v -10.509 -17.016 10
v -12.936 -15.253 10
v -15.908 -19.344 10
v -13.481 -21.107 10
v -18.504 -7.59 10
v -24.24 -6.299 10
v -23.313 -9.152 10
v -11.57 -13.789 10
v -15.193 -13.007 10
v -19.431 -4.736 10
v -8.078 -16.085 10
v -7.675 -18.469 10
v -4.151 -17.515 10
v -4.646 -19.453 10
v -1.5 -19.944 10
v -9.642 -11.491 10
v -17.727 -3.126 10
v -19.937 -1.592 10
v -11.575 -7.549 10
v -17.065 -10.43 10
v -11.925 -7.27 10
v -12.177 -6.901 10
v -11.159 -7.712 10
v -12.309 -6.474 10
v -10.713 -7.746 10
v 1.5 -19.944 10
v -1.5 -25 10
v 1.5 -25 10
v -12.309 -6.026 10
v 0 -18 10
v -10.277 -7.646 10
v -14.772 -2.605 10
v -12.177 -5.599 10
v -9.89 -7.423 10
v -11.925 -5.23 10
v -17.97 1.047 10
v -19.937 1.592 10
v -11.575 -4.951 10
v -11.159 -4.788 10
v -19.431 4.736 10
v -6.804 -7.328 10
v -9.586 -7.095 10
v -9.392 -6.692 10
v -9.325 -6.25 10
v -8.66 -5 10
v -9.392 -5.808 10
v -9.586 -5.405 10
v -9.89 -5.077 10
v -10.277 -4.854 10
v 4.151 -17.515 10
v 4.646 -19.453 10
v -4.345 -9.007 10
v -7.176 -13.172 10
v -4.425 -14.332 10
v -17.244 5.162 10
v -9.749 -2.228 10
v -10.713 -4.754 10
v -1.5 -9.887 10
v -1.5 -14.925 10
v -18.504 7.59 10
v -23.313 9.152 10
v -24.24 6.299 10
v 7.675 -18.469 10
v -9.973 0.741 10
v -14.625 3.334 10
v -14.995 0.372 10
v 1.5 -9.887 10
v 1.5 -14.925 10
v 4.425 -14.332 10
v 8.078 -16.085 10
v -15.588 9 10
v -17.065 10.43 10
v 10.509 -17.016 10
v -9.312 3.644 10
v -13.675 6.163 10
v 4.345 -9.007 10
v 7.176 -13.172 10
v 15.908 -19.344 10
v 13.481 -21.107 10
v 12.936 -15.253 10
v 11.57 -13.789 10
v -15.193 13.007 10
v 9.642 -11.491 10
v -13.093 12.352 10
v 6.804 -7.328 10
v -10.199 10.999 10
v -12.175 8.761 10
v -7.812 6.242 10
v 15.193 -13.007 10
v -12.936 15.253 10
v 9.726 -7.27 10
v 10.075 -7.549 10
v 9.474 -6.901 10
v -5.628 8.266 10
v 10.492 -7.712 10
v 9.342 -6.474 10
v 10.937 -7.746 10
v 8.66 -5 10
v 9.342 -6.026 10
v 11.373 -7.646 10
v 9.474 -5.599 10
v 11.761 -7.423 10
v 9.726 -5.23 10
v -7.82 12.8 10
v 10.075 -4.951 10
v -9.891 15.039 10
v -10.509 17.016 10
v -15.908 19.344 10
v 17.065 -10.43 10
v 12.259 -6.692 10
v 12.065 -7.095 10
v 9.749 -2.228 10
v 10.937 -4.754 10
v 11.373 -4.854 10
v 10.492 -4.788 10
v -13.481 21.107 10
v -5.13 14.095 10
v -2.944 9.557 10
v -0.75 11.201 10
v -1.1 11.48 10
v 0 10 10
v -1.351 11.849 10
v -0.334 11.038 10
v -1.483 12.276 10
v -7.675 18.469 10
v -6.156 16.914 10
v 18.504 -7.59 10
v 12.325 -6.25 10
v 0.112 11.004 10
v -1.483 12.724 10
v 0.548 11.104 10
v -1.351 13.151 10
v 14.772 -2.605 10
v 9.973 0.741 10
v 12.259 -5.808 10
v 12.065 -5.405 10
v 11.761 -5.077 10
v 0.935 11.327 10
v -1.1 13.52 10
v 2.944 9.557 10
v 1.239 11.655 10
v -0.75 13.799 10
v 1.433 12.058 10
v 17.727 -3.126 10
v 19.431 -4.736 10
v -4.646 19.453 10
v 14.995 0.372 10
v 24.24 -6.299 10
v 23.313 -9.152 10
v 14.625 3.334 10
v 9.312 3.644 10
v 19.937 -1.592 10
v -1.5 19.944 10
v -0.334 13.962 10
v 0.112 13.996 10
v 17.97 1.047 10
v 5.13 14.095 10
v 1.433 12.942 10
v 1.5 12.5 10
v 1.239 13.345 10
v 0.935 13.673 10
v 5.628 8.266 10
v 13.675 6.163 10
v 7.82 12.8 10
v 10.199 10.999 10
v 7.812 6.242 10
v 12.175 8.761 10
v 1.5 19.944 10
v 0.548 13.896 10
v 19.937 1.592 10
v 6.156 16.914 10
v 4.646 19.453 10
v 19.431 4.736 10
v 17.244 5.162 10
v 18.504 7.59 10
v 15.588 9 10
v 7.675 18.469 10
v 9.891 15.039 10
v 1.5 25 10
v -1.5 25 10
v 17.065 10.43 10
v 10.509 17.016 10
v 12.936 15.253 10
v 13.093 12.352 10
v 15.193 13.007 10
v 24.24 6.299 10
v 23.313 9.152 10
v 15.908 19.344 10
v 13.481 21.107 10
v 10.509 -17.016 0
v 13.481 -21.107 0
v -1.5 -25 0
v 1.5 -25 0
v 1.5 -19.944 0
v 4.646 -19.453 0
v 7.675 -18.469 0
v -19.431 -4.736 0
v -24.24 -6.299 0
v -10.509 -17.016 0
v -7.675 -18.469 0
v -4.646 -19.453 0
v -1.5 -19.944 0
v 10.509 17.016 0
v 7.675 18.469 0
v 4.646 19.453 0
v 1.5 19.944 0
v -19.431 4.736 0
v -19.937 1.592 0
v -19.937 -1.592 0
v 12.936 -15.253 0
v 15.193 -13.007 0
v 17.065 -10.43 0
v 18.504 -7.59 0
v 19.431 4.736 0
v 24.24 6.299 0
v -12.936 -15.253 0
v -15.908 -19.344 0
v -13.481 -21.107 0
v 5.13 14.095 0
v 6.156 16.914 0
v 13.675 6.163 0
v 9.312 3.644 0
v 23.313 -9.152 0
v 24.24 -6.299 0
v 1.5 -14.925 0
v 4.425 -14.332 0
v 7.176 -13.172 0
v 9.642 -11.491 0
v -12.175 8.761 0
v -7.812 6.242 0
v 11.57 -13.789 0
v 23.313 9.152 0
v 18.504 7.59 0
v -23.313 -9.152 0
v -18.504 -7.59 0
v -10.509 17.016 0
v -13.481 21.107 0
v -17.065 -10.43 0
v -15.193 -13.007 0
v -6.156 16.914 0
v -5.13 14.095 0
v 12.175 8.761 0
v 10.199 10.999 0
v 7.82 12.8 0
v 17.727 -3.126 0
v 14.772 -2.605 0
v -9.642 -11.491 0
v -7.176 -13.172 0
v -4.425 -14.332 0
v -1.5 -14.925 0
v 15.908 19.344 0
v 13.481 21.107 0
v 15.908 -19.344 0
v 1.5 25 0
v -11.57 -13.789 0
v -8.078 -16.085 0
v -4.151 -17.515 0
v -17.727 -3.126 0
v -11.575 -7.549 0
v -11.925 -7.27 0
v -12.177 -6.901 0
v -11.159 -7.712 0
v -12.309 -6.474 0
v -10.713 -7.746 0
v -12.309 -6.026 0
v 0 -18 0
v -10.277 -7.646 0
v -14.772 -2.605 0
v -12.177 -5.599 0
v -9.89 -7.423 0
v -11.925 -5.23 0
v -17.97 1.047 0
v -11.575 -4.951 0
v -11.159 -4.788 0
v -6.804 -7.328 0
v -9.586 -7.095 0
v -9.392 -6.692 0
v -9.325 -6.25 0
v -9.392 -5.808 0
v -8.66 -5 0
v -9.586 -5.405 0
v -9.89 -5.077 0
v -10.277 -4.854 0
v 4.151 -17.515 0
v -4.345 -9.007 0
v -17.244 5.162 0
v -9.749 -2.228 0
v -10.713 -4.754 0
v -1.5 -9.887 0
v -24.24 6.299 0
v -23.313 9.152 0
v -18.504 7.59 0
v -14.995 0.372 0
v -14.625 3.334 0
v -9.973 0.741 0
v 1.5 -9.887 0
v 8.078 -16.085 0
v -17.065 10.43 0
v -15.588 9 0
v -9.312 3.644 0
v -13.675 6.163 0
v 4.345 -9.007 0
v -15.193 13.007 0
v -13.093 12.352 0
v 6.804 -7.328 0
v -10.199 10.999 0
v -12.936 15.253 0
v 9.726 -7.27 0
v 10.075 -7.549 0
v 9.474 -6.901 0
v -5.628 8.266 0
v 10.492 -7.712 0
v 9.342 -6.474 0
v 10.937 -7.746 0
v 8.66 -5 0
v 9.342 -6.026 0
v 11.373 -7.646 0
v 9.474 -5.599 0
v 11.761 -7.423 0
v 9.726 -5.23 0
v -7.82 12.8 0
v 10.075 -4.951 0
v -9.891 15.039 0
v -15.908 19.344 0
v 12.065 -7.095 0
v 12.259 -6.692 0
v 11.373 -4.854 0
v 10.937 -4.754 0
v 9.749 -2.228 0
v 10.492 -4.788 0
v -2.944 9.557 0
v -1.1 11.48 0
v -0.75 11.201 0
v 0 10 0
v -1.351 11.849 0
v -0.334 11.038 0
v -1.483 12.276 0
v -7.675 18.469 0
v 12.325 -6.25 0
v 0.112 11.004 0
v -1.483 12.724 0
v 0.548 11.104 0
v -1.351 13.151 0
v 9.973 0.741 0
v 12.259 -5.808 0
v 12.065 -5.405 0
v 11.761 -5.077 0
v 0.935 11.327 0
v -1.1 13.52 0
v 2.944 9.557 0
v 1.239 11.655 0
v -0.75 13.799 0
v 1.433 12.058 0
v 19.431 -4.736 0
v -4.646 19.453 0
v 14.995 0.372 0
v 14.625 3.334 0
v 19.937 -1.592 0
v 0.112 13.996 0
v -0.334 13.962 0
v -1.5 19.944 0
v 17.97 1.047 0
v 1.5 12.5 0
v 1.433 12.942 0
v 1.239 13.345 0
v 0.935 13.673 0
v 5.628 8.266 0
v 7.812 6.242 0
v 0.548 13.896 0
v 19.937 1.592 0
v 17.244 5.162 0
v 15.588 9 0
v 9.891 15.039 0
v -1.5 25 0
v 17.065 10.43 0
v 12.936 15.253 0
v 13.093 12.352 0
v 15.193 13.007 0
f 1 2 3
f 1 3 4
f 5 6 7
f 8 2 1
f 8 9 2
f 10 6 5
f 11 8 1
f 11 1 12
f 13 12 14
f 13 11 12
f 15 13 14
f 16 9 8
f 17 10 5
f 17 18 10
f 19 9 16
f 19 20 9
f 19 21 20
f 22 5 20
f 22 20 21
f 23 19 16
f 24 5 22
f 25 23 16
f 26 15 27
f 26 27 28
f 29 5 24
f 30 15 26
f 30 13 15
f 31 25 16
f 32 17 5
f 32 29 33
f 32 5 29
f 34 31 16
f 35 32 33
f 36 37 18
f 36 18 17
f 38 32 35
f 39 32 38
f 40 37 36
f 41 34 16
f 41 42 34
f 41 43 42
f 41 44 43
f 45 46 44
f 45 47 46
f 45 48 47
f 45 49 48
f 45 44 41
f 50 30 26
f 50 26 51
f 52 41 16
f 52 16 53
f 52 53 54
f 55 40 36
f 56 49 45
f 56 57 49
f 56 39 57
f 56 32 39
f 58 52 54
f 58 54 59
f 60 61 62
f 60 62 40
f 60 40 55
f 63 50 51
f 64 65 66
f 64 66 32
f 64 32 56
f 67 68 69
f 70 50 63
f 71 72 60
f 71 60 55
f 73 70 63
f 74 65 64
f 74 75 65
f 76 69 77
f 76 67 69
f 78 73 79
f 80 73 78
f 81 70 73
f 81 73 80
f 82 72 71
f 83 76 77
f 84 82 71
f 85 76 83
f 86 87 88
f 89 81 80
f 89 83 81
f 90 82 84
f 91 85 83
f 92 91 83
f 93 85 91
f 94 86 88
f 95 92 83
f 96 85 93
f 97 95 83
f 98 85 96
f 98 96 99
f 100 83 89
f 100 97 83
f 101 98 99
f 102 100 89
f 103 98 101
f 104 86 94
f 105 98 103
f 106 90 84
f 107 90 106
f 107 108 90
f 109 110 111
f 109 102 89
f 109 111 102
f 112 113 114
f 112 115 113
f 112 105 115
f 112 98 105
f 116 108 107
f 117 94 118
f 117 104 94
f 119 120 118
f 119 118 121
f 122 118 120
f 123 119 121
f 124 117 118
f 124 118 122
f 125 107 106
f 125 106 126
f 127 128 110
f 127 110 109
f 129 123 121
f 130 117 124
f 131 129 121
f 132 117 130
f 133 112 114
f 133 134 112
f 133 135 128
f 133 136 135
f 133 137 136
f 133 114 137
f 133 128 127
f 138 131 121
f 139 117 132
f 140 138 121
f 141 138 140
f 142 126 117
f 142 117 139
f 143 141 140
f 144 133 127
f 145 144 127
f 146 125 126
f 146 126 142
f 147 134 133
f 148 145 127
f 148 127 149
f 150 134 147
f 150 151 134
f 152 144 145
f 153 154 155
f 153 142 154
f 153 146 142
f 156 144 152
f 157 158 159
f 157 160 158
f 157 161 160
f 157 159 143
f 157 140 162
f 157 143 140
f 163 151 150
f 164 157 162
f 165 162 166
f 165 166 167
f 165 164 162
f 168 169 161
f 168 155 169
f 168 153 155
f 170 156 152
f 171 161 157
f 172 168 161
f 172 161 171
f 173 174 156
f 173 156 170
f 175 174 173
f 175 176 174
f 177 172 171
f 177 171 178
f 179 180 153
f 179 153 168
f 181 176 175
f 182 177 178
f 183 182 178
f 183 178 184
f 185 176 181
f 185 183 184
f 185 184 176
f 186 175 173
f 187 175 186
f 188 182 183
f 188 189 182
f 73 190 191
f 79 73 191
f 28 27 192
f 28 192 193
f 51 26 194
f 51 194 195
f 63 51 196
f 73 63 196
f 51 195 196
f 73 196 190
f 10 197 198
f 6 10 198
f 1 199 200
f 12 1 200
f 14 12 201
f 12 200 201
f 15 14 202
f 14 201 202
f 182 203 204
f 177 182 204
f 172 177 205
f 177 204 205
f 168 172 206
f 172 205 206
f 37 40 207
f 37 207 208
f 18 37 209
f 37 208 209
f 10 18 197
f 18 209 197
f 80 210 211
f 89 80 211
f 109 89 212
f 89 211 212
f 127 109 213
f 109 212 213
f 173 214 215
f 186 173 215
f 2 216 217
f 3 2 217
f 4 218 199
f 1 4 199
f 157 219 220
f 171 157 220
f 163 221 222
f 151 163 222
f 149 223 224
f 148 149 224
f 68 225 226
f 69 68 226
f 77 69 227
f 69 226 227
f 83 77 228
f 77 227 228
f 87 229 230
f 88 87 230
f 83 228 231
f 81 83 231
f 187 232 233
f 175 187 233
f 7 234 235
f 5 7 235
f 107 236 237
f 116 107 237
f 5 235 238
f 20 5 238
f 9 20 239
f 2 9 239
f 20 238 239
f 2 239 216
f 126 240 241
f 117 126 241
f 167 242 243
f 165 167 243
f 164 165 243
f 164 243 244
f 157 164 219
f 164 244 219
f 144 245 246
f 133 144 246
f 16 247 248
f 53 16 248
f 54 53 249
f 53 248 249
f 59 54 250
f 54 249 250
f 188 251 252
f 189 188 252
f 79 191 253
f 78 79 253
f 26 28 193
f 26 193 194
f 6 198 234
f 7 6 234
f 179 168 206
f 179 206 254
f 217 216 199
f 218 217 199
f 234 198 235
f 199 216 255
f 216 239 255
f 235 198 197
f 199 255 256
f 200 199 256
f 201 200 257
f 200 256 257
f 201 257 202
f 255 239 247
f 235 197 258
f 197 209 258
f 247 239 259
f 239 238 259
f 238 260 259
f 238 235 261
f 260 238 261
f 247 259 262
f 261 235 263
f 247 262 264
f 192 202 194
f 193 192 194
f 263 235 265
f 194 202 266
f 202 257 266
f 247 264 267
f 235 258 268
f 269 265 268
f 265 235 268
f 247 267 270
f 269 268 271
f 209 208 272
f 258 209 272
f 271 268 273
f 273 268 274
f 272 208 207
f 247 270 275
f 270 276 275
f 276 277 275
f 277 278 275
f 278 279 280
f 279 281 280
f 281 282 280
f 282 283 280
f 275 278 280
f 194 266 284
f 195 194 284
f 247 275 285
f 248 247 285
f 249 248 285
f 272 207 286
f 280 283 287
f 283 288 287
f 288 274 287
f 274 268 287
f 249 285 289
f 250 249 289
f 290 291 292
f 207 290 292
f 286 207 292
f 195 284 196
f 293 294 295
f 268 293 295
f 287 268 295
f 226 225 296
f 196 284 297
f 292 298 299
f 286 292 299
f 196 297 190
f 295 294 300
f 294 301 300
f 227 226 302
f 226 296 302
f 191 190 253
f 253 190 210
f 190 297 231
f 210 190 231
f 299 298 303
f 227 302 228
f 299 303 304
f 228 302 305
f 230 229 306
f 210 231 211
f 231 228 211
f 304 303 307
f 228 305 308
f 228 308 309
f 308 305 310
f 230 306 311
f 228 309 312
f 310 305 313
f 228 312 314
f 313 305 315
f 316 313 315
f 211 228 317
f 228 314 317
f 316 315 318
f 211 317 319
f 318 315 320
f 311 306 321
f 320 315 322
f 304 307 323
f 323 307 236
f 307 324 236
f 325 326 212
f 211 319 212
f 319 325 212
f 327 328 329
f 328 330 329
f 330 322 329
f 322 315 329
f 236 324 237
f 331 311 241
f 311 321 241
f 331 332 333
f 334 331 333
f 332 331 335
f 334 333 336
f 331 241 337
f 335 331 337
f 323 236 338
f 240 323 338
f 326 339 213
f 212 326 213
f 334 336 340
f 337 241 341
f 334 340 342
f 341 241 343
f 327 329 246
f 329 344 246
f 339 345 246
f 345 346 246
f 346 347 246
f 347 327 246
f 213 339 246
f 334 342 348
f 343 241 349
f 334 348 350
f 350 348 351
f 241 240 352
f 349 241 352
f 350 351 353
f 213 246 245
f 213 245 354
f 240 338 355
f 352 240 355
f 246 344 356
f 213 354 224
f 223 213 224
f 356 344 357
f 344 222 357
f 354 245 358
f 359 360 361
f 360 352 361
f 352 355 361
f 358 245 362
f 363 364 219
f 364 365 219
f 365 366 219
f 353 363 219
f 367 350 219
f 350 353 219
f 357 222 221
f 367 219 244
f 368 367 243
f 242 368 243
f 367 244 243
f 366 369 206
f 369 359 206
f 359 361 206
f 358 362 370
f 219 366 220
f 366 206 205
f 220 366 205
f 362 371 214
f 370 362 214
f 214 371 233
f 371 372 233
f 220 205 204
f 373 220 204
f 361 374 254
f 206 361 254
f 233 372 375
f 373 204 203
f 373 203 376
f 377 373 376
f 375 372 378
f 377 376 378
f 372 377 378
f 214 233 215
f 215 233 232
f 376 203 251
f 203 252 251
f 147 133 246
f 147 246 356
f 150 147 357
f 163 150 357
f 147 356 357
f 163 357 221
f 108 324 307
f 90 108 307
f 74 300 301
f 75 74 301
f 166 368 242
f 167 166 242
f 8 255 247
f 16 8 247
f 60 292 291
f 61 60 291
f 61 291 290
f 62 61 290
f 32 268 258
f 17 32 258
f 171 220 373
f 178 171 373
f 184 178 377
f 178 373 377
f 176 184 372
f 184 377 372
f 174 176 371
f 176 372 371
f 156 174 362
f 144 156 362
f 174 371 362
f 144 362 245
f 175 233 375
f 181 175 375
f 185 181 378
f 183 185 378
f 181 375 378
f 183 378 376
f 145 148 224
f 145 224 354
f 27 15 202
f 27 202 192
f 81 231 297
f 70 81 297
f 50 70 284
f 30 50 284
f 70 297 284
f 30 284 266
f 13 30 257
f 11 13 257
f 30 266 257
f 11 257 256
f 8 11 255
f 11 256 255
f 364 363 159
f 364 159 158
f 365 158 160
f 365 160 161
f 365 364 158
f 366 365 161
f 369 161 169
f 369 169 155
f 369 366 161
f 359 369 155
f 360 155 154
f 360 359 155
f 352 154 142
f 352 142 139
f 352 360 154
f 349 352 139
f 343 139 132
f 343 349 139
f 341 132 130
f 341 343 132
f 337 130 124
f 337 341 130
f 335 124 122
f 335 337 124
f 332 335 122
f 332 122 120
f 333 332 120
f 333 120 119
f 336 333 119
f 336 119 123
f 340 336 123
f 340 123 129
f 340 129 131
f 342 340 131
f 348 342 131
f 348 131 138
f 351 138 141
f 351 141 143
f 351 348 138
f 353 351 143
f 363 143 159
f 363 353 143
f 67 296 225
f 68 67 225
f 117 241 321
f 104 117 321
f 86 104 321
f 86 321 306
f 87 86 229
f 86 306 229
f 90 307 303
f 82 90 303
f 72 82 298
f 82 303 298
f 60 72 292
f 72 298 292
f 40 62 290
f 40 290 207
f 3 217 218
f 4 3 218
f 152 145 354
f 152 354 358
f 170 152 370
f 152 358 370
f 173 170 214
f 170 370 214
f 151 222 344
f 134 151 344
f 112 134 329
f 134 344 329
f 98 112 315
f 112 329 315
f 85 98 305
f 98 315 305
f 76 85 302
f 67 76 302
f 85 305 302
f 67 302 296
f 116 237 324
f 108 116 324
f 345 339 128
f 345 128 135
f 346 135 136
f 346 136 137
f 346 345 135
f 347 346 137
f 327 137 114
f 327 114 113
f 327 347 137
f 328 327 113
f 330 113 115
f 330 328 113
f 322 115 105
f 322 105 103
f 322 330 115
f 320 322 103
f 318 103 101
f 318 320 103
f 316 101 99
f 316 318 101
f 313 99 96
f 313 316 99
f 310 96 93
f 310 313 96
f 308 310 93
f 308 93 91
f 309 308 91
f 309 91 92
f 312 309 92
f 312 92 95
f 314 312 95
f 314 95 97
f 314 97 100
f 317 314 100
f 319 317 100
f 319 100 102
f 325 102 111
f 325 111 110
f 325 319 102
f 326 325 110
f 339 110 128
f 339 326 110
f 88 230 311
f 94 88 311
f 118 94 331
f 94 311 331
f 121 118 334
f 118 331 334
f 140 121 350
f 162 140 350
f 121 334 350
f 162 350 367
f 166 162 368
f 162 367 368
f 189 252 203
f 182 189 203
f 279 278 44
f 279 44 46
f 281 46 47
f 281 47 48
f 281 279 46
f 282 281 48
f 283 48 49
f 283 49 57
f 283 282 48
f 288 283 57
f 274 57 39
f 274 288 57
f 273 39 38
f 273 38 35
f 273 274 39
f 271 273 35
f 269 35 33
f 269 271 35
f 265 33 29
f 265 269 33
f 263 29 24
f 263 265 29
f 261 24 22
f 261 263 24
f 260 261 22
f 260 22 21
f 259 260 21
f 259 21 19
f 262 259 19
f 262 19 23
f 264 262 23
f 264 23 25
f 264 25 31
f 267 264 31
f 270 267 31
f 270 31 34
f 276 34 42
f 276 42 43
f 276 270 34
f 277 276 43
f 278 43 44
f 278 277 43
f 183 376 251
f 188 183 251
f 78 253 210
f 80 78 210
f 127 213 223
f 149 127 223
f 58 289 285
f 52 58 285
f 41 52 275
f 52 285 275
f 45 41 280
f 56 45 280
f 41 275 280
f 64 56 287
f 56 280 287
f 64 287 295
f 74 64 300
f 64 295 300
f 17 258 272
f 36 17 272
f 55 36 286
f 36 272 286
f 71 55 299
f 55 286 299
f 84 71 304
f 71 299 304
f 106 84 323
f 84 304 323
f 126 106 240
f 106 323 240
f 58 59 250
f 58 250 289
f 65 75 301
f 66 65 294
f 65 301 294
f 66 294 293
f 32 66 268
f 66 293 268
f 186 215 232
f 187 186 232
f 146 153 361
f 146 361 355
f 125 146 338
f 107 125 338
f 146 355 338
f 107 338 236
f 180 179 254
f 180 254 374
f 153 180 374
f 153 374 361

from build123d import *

# Parameters (mm, degrees)
SKETCH_1_R          = 1.5
EXTRUDE_1_DEPTH     = 10
CUT_EXTRUDE_2_DEPTH = 10


with BuildPart() as part:
    # 草图1 → 凸台-拉伸1 (new body)
    with BuildSketch(Plane.XY):
        with BuildLine():
            Line((1.5, 19.943670675), (1.5, 25))
            Line((1.5, 25), (-1.5, 25))
            Line((-1.5, 25), (-1.5, 19.943670675))
            ThreePointArc((-1.5, 19.943670675), (-6.180339888, 19.021130326), (-10.509070008, 17.016446385))
            Line((-10.509070008, 17.016446385), (-13.481105816, 21.107102738))
            Line((-13.481105816, 21.107102738), (-15.908156799, 19.343746981))
            Line((-15.908156799, 19.343746981), (-12.936120991, 15.253090628))
            ThreePointArc((-12.936120991, 15.253090628), (-16.180339887, 11.755705046), (-18.504032463, 7.589517943))
            Line((-18.504032463, 7.589517943), (-23.312887416, 9.152009634))
            Line((-23.312887416, 9.152009634), (-24.239938399, 6.298840085))
            Line((-24.239938399, 6.298840085), (-19.431083446, 4.736348394))
            ThreePointArc((-19.431083446, 4.736348394), (-20, 0), (-19.431083446, -4.736348394))
            Line((-19.431083446, -4.736348394), (-24.239938399, -6.298840085))
            Line((-24.239938399, -6.298840085), (-23.312887416, -9.152009634))
            Line((-23.312887416, -9.152009634), (-18.504032463, -7.589517943))
            ThreePointArc((-18.504032463, -7.589517943), (-16.180339887, -11.755705046), (-12.936120991, -15.253090628))
            Line((-12.936120991, -15.253090628), (-15.908156799, -19.343746981))
            Line((-15.908156799, -19.343746981), (-13.481105816, -21.107102738))
            Line((-13.481105816, -21.107102738), (-10.509070008, -17.016446385))
            ThreePointArc((-10.509070008, -17.016446385), (-6.180339887, -19.021130326), (-1.5, -19.943670675))
            Line((-1.5, -19.943670675), (-1.5, -25))
            Line((-1.5, -25), (1.5, -25))
            Line((1.5, -25), (1.5, -19.943670675))
            ThreePointArc((1.5, -19.943670675), (6.180339888, -19.021130326), (10.509070008, -17.016446385))
            Line((10.509070008, -17.016446385), (13.481105816, -21.107102738))
            Line((13.481105816, -21.107102738), (15.908156799, -19.343746981))
            Line((15.908156799, -19.343746981), (12.936120991, -15.253090628))
            ThreePointArc((12.936120991, -15.253090628), (16.180339887, -11.755705046), (18.504032463, -7.589517943))
            Line((18.504032463, -7.589517943), (23.312887416, -9.152009634))
            Line((23.312887416, -9.152009634), (24.239938399, -6.298840085))
            Line((24.239938399, -6.298840085), (19.431083446, -4.736348394))
            ThreePointArc((19.431083446, -4.736348394), (20, 0), (19.431083446, 4.736348394))
            Line((19.431083446, 4.736348394), (24.239938399, 6.298840085))
            Line((24.239938399, 6.298840085), (23.312887416, 9.152009634))
            Line((23.312887416, 9.152009634), (18.504032463, 7.589517943))
            ThreePointArc((18.504032463, 7.589517943), (16.180339887, 11.755705046), (12.936120991, 15.253090628))
            Line((12.936120991, 15.253090628), (15.908156799, 19.343746981))
            Line((15.908156799, 19.343746981), (13.481105816, 21.107102738))
            Line((13.481105816, 21.107102738), (10.509070008, 17.016446385))
            ThreePointArc((10.509070008, 17.016446385), (6.180339887, 19.021130326), (1.5, 19.943670675))
        make_face()
        with Locations((0, 12.5)):
            Circle(SKETCH_1_R, mode=Mode.SUBTRACT)
        with Locations((10.825317547, -6.25)):
            Circle(SKETCH_1_R, mode=Mode.SUBTRACT)
        with Locations((-10.825317547, -6.25)):
            Circle(SKETCH_1_R, mode=Mode.SUBTRACT)
    extrude(amount=EXTRUDE_1_DEPTH)

    # 草图2 → 切除-拉伸2 (cut)
    with BuildSketch(Plane.XY):
        with BuildLine():
            Line((-9.312271895, 3.644391878), (-13.675265955, 6.163367673))
            ThreePointArc((-13.675265955, 6.163367673), (-14.883992786, 1.861923398), (-14.772116295, -2.604722665))
            Line((-14.772116295, -2.604722665), (-17.726539554, -3.125667198))
            ThreePointArc((-17.726539554, -3.125667198), (-15.588457268, 9), (-6.15636258, 16.914467174))
            Line((-6.15636258, 16.914467174), (-5.13030215, 14.095389312))
            ThreePointArc((-5.13030215, 14.095389312), (-9.054469356, 11.958954164), (-12.175265955, 8.761443884))
            Line((-12.175265955, 8.761443884), (-7.812271895, 6.242468089))
            ThreePointArc((-7.812271895, 6.242468089), (0, 10), (7.812271895, 6.242468089))
            Line((7.812271895, 6.242468089), (12.175265955, 8.761443884))
            ThreePointArc((12.175265955, 8.761443884), (9.054469356, 11.958954164), (5.13030215, 14.095389312))
            Line((5.13030215, 14.095389312), (6.15636258, 16.914467174))
            ThreePointArc((6.15636258, 16.914467174), (15.588457268, 9), (17.726539554, -3.125667198))
            Line((17.726539554, -3.125667198), (14.772116295, -2.604722665))
            ThreePointArc((14.772116295, -2.604722665), (14.883992786, 1.861923398), (13.675265955, 6.163367673))
            Line((13.675265955, 6.163367673), (9.312271895, 3.644391878))
            ThreePointArc((9.312271895, 3.644391878), (8.660254038, -5), (1.5, -9.886859967))
            Line((1.5, -9.886859967), (1.5, -14.924811557))
            ThreePointArc((1.5, -14.924811557), (5.829523431, -13.820877562), (9.641814145, -11.490666647))
            Line((9.641814145, -11.490666647), (11.570176974, -13.788799976))
            ThreePointArc((11.570176974, -13.788799976), (0, -18), (-11.570176974, -13.788799976))
            Line((-11.570176974, -13.788799976), (-9.641814145, -11.490666647))
            ThreePointArc((-9.641814145, -11.490666647), (-5.829523431, -13.820877562), (-1.5, -14.924811557))
            Line((-1.5, -14.924811557), (-1.5, -9.886859967))
            ThreePointArc((-1.5, -9.886859967), (-8.660254038, -5), (-9.312271895, 3.644391878))
        make_face()
    extrude(amount=CUT_EXTRUDE_2_DEPTH, mode=Mode.SUBTRACT)


solid = part.part
